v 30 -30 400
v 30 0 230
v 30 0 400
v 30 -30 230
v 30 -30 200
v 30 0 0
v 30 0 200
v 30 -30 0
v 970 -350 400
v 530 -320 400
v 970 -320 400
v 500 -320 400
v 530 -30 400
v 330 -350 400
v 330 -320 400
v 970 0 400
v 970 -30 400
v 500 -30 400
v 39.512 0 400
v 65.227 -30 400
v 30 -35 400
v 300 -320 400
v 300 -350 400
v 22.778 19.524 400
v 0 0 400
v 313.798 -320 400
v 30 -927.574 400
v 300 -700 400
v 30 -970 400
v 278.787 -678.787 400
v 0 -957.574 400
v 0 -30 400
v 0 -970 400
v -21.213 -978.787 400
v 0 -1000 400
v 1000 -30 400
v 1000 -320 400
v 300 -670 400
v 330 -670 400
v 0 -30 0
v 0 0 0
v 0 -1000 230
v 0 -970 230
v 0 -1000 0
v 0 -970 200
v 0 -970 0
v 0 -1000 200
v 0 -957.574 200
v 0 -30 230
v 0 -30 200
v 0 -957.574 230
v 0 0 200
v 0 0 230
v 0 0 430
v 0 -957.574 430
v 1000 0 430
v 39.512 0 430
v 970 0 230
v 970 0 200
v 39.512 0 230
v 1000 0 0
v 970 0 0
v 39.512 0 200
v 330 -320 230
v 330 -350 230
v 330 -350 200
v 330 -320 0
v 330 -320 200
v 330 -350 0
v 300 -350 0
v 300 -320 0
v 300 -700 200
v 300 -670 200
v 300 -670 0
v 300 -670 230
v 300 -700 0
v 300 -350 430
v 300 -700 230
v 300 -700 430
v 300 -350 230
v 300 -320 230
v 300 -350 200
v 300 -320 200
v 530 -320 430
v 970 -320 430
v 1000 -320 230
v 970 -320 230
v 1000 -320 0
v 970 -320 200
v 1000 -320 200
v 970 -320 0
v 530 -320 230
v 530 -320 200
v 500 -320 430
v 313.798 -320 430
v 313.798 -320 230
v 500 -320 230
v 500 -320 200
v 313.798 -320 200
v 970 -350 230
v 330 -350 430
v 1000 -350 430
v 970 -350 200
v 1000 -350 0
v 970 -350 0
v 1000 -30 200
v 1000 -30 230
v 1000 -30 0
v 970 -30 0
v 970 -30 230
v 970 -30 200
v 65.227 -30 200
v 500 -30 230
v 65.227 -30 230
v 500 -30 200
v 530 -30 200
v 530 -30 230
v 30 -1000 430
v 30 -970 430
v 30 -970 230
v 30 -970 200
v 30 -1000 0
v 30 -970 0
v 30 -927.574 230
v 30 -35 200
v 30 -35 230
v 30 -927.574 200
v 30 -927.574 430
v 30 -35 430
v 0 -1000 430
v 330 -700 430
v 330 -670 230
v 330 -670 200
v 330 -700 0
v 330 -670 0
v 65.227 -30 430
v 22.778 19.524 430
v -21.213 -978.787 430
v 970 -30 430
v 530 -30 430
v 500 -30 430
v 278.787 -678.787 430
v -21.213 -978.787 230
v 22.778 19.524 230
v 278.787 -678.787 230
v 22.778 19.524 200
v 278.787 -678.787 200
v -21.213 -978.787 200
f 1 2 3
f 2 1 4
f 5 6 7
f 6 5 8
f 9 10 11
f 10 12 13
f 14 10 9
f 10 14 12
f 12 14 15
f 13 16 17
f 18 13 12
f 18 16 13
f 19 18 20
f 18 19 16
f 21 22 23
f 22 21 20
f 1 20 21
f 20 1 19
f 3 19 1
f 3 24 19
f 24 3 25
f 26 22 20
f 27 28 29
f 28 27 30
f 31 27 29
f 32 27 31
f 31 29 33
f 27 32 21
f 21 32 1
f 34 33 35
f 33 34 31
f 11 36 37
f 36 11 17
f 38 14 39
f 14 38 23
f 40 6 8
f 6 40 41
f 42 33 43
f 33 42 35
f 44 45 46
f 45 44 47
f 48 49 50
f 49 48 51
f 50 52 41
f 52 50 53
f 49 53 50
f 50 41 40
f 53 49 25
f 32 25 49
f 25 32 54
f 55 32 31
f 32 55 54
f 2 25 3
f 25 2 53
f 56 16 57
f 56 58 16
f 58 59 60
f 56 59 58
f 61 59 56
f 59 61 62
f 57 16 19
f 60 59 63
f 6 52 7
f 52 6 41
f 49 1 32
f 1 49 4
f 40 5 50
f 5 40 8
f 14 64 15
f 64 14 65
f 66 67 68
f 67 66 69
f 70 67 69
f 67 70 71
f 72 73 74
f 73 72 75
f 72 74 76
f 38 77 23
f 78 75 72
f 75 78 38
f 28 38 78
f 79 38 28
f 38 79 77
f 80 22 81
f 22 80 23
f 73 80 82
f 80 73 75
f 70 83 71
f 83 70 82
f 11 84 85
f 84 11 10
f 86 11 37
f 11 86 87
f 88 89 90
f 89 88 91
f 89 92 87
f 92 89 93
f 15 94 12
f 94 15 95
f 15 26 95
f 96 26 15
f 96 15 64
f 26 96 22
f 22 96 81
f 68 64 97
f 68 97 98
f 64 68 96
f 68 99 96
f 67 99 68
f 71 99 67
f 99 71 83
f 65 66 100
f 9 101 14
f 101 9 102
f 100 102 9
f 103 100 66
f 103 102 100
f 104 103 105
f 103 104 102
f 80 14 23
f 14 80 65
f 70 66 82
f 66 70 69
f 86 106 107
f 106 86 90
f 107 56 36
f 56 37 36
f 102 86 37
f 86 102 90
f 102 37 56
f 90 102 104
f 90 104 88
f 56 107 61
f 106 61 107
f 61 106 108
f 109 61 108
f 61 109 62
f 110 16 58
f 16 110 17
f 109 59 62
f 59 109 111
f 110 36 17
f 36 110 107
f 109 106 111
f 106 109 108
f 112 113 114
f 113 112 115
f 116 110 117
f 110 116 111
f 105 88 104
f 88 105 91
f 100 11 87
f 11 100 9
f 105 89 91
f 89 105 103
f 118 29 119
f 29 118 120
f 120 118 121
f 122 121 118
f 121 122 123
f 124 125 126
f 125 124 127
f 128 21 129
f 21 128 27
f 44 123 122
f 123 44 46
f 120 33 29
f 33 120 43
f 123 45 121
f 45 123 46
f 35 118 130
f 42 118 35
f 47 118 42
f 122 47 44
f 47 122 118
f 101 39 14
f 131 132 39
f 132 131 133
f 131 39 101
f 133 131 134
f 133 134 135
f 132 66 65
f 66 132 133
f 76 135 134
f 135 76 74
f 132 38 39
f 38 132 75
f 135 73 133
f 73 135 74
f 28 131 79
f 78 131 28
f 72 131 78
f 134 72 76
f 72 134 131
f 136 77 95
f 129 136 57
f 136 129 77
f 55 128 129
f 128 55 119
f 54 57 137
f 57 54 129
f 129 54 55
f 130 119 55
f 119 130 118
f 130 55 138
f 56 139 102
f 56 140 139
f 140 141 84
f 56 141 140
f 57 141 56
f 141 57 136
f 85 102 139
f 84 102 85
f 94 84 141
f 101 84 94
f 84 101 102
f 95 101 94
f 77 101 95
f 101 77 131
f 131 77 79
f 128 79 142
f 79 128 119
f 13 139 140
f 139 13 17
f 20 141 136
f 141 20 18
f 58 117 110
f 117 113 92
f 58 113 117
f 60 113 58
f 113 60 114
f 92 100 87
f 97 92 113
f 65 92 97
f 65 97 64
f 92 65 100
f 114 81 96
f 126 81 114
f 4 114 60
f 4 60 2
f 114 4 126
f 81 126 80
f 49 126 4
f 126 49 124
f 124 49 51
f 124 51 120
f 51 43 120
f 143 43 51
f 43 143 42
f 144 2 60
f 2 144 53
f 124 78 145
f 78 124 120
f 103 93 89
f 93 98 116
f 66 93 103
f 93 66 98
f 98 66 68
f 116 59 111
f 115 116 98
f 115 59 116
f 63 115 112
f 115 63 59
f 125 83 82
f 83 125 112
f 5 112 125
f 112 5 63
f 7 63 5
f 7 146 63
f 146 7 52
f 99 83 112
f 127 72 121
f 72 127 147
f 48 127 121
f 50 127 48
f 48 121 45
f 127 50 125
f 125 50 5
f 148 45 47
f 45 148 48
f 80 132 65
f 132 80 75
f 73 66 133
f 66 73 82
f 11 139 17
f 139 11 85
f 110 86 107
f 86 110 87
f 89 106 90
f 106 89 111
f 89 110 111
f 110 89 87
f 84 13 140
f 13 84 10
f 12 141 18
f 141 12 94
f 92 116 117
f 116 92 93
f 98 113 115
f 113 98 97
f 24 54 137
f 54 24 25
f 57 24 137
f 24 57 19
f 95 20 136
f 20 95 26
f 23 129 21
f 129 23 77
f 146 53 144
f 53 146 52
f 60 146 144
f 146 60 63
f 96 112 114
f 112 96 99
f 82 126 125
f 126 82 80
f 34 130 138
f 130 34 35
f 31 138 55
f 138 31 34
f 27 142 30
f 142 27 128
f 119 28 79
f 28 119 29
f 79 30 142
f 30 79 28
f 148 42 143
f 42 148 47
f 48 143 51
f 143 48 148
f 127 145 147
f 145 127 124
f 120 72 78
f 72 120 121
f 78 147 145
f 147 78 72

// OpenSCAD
// Dimensions
frame_main_width = 1000;
frame_main_depth = 350;
frame_side_width_rear = 1000;
frame_side_width_front = 700;
frame_side_depth = 300;
frame_height = 400;

leg_width = 30;
leg_depth = 30;

// Positions
rear_corner_leg = [0, -leg_depth, 0];
front_corner_leg = [frame_side_depth, -frame_main_depth, 0];
right_rear_leg = [frame_main_width - leg_width, -leg_depth, 0];
right_front_leg = [frame_main_width - leg_width, -frame_main_depth, 0];
side_rear_leg = [0, -frame_side_width_rear, 0];
side_front_leg = [frame_side_depth, -frame_side_width_front, 0];


// Helpers
function diag_len(a, b) = sqrt(pow(a, 2) + pow(b, 2));

// Components
module leg() {
    color([0, 0, 1])
    cube([leg_width, leg_depth, frame_height]);
}

module horizontal_strut(width) {
    color([1, 0, 0])
    cube([width, leg_depth, leg_width]);
}

module depth_strut(width) {
    rotate([0, 0, -90])
    color([0, 1, 0])
    horizontal_strut(width);
}

module diagonal_strut(width, angle) {
    rotate([0, 0, angle])
    color([1, 1, 0])
    horizontal_strut(width);
}


// Legs
translate(rear_corner_leg) leg();
translate(front_corner_leg) leg();
translate(right_rear_leg) leg();
translate(right_front_leg) leg();
translate(side_rear_leg) leg();
translate(side_front_leg) leg();

// Frame
translate([0, -leg_depth, frame_height]) {
    horizontal_strut(frame_main_width);
}

translate([0, -leg_depth, frame_height/2]) {
    horizontal_strut(frame_main_width);
}

translate([frame_side_depth, -frame_main_depth, frame_height]) {
    horizontal_strut(frame_main_width - frame_side_depth);
}

translate([frame_side_depth, -frame_main_depth, frame_height/2]) {
    horizontal_strut(frame_main_width - frame_side_depth);
}

translate([0, 0, frame_height]) {
    depth_strut(frame_side_width_rear);
}

translate([0, 0, frame_height/2]) {
    depth_strut(frame_side_width_rear);
}

translate([frame_side_depth, -frame_main_depth, frame_height]) {
    depth_strut(frame_side_width_front - frame_main_depth);
}

translate([frame_side_depth, -frame_main_depth, frame_height/2]) {
    depth_strut(frame_side_width_front - frame_main_depth);
}

translate([frame_main_width - leg_width, 0, frame_height]) {
    depth_strut(frame_main_depth);
}

translate([frame_main_width - leg_width, 0, frame_height/2]) {
    depth_strut(frame_main_depth);
}

translate([frame_main_width/2, 0, frame_height]) {
    depth_strut(frame_main_depth);
}

translate([frame_main_width/2, 0, frame_height/2]) {
    depth_strut(frame_main_depth);
}

translate([0, 0, frame_height]) {
    diagonal_strut(
        diag_len(frame_main_depth, frame_side_depth),
        -acos(frame_side_depth/diag_len(frame_main_depth, frame_side_depth))
    );
}

translate([0, 0, frame_height/2]) {
    diagonal_strut(
        diag_len(frame_main_depth, frame_side_depth),
        -acos(frame_side_depth/diag_len(frame_main_depth, frame_side_depth))
    );
}

translate([0, -frame_side_width_rear, frame_height]) {
    diagonal_strut(
        diag_len(frame_side_depth, frame_side_width_rear - frame_side_width_front),
        acos(frame_side_depth/diag_len(frame_side_depth, frame_side_width_rear - frame_side_width_front))
    );
}

translate([0, -frame_side_width_rear, frame_height/2]) {
    diagonal_strut(
        diag_len(frame_side_depth, frame_side_width_rear - frame_side_width_front),
        acos(frame_side_depth/diag_len(frame_side_depth, frame_side_width_rear - frame_side_width_front))
    );
}
